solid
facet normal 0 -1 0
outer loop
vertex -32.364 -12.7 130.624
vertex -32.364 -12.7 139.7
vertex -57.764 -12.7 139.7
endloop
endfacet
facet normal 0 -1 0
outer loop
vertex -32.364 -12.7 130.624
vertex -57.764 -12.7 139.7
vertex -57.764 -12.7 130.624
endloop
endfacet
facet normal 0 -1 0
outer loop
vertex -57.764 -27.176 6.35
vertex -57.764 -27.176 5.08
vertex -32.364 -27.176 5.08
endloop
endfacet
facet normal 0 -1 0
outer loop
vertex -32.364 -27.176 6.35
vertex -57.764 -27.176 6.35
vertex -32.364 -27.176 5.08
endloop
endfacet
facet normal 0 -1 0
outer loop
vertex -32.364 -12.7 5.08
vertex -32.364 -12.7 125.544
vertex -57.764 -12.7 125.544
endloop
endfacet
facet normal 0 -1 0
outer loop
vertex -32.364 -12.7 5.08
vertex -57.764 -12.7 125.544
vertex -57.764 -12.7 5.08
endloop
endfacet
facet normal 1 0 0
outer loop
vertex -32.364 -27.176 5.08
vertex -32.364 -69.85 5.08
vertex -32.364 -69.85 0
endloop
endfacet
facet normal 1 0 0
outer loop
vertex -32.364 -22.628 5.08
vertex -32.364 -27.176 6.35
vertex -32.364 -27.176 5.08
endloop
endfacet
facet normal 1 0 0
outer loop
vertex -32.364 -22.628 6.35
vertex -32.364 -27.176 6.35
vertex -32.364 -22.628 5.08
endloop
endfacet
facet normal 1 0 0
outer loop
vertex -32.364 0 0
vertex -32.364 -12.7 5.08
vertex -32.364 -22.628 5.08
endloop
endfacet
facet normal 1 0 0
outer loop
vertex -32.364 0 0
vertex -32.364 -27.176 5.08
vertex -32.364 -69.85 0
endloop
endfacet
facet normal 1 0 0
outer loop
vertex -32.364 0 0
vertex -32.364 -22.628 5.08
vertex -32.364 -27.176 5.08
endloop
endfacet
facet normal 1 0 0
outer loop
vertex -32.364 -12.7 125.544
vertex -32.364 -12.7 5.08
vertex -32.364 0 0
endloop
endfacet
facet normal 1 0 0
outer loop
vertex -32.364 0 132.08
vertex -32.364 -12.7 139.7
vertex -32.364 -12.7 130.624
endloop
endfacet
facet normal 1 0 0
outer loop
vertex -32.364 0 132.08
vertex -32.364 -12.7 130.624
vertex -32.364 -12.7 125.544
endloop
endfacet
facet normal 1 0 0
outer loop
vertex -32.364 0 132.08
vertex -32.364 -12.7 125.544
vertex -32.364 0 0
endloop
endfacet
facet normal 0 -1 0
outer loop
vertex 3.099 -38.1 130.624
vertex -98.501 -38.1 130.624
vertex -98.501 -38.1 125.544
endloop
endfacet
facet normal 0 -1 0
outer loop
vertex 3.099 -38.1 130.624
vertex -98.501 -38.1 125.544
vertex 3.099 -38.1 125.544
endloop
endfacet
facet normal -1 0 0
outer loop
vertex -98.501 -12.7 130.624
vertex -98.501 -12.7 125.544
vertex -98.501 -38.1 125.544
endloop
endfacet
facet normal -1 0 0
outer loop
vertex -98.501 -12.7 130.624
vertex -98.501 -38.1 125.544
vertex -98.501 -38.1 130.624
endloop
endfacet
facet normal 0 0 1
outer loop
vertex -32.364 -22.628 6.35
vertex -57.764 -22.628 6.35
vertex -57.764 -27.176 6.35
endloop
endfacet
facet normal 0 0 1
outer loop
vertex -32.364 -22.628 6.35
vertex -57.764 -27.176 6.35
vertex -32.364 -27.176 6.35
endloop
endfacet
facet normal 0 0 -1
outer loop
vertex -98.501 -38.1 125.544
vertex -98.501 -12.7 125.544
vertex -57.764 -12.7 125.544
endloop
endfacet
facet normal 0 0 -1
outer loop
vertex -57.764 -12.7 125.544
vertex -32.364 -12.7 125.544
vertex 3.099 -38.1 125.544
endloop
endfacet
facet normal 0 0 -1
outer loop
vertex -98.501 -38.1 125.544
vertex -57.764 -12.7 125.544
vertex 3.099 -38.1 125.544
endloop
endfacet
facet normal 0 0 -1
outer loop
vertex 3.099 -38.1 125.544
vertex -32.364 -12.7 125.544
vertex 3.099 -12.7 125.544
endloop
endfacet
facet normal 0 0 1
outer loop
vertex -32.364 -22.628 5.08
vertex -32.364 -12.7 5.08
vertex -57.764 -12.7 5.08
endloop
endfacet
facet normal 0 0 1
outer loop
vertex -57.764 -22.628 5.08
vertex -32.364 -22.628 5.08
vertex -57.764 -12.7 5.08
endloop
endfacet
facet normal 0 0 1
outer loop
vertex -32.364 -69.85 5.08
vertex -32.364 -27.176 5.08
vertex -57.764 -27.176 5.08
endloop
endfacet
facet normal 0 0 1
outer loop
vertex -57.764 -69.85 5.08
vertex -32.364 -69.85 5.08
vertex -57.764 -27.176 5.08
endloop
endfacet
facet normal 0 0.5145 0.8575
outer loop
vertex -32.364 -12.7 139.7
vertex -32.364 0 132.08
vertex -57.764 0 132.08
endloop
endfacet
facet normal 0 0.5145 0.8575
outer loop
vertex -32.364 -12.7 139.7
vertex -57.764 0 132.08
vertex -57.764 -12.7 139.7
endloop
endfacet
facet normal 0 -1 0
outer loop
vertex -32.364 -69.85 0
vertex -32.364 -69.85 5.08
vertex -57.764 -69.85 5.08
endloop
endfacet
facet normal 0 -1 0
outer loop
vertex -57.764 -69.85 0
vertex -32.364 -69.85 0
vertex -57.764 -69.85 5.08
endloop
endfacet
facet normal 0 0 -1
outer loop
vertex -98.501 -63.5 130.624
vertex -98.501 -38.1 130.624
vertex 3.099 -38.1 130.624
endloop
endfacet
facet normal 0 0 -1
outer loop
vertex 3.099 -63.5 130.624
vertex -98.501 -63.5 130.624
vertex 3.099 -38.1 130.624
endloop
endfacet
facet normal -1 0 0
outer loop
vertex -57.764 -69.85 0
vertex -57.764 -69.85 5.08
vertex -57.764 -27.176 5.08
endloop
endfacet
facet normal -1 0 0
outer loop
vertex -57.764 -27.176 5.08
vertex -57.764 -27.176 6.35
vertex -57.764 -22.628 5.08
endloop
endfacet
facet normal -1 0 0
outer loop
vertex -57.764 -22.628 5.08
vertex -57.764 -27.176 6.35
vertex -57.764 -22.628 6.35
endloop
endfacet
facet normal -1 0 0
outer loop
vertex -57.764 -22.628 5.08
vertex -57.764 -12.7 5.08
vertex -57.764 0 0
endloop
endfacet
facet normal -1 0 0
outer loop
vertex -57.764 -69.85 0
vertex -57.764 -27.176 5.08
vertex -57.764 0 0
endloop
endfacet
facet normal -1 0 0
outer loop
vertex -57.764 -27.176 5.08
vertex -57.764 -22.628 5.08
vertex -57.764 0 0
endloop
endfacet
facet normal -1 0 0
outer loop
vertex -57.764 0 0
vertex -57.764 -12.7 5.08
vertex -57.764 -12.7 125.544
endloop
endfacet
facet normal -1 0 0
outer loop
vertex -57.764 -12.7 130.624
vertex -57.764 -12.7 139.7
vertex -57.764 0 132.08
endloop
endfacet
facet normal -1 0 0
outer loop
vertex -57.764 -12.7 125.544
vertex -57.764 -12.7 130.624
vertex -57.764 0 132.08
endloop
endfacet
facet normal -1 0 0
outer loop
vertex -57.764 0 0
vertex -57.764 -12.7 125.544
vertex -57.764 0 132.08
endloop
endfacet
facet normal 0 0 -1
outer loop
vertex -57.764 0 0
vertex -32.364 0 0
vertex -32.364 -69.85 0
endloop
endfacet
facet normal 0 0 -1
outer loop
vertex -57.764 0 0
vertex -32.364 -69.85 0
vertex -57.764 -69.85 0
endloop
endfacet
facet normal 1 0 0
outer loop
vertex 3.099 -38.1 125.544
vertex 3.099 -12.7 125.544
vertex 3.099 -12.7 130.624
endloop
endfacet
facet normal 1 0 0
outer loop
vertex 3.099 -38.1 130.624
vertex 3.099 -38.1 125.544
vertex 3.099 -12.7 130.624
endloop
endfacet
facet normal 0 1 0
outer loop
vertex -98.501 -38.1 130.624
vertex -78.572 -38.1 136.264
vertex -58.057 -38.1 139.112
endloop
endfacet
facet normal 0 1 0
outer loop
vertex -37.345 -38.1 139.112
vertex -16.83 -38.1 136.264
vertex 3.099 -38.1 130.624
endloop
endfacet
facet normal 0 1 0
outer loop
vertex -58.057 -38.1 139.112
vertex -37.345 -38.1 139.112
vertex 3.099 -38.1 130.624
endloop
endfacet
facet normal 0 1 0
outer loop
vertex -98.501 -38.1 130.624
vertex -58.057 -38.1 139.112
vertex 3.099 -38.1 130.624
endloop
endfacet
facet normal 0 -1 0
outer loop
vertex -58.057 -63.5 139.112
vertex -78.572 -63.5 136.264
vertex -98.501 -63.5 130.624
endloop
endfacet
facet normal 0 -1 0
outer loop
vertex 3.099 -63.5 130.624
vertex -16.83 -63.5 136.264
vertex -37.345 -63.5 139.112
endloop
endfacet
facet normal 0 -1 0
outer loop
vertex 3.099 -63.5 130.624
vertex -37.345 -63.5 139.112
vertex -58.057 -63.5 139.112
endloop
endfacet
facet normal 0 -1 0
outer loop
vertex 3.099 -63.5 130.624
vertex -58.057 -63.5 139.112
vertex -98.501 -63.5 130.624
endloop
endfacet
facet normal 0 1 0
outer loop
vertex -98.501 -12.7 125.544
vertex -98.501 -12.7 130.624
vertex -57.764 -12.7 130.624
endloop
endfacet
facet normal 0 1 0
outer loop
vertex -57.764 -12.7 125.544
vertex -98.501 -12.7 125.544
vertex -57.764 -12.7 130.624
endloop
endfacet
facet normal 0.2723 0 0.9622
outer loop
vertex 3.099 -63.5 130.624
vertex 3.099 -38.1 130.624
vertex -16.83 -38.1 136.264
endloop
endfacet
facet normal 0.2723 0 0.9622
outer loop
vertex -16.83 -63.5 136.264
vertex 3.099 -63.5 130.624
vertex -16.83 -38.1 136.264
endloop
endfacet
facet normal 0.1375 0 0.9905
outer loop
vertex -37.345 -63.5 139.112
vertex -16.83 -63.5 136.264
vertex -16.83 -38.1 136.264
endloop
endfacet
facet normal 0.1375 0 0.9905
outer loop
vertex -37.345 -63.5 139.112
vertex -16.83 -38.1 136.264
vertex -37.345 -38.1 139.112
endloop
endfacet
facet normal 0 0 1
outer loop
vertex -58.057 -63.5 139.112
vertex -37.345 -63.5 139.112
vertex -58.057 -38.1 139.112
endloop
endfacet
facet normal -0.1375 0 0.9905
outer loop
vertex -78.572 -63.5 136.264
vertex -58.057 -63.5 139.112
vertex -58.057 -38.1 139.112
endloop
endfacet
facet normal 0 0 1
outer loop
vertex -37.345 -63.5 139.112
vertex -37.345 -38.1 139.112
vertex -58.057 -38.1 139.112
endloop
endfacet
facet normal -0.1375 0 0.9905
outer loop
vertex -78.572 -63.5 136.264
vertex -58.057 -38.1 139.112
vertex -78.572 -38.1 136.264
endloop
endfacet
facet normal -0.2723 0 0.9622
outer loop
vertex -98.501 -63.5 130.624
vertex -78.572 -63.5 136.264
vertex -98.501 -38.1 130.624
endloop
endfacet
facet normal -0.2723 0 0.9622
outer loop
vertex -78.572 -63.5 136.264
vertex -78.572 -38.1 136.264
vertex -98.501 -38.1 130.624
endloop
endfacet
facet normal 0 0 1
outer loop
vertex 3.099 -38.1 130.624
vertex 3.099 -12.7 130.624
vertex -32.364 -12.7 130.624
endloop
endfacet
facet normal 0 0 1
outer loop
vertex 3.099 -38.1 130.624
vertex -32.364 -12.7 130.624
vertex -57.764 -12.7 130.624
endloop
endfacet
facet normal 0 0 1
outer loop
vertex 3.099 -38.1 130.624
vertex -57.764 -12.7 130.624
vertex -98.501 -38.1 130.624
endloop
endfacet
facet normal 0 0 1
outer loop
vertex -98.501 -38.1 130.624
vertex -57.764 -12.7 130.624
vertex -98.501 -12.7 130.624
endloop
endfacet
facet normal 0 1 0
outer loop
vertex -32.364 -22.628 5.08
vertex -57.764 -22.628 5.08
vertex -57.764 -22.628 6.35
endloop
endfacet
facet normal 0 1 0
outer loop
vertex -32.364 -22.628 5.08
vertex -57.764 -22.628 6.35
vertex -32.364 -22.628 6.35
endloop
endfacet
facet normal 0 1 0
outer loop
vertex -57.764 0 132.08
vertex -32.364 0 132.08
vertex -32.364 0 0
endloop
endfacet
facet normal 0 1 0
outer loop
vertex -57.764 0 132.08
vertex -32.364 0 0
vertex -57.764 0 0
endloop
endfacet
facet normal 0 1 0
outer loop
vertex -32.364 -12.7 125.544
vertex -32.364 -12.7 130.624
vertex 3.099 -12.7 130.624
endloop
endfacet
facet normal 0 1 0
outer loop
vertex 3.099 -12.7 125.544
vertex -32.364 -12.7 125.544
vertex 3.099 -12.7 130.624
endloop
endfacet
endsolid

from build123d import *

# Parameters (mm, degrees)
F0_W      = 25.4
F0_H      = 127
F1_DEPTH  = 12.7
F2_W      = 25.4
F2_H      = 5.08
F3_DEPTH  = 69.85
F5_DEPTH  = 25.4
F6_W      = 40.737465024
F6_H      = 5.08
F6_W_2    = 35.462534976
F6_W_3    = 25.4
F7_DEPTH  = 25.4
F9_DEPTH  = 25.4
F10_W     = 25.4
F10_H     = 4.5485440642
F11_DEPTH = 1.27


with BuildPart() as f1:
    # F0 (on Front) → F1 (new body)
    with BuildSketch(Plane.XZ):
        with Locations((-45.0637851238, 68.58)):
            Rectangle(F0_W, F0_H)
    extrude(amount=F1_DEPTH)

    # F2 (on face) → F3 (join)
    with BuildSketch(Plane(origin=(0, 0, 0), x_dir=(-1, 0, 0), z_dir=(0, 1, 0))):
        with Locations((45.0637851238, 2.54)):
            Rectangle(F2_W, F2_H)
    extrude(amount=-F3_DEPTH)

    # F4 (on face) → F5 (join)
    with BuildSketch(Plane.YZ.offset(-32.3637851238)):
        Polygon((0, 132.08), (-12.7, 139.7), (-12.7, 132.08), align=None)
    extrude(amount=-F5_DEPTH)

    # F6 (on face) → F7 (join)
    with BuildSketch(Plane.XZ.offset(12.7)):
        with Locations((-78.1325176358, 128.0839221859)):
            Rectangle(F6_W, F6_H)
        with Locations((-14.6325176358, 128.0839221859)):
            Rectangle(F6_W_2, F6_H)
        with Locations((-45.0637851238, 128.0839221859)):
            Rectangle(F6_W_3, F6_H)
    extrude(amount=F7_DEPTH)

    # F10 (on face) → F11 (join)
    with BuildSketch(Plane.XY.offset(5.08)):
        with Locations((-45.0637851238, -24.9021770433)):
            Rectangle(F10_W, F10_H)
    extrude(amount=F11_DEPTH)


with BuildPart() as f9:
    # F8 (on face) → F9 (new body)
    with BuildSketch(Plane.XZ.offset(38.1)):
        with BuildLine():
            Line((-98.5012501478, 130.6239221859), (3.0987498522, 130.6239221859))
            ThreePointArc((3.0987498522, 130.6239221859), (-47.7012501478, 139.4689772047), (-98.5012501478, 130.6239221859))
        make_face()
    extrude(amount=F9_DEPTH)


solid = Compound([f1.part, f9.part])
